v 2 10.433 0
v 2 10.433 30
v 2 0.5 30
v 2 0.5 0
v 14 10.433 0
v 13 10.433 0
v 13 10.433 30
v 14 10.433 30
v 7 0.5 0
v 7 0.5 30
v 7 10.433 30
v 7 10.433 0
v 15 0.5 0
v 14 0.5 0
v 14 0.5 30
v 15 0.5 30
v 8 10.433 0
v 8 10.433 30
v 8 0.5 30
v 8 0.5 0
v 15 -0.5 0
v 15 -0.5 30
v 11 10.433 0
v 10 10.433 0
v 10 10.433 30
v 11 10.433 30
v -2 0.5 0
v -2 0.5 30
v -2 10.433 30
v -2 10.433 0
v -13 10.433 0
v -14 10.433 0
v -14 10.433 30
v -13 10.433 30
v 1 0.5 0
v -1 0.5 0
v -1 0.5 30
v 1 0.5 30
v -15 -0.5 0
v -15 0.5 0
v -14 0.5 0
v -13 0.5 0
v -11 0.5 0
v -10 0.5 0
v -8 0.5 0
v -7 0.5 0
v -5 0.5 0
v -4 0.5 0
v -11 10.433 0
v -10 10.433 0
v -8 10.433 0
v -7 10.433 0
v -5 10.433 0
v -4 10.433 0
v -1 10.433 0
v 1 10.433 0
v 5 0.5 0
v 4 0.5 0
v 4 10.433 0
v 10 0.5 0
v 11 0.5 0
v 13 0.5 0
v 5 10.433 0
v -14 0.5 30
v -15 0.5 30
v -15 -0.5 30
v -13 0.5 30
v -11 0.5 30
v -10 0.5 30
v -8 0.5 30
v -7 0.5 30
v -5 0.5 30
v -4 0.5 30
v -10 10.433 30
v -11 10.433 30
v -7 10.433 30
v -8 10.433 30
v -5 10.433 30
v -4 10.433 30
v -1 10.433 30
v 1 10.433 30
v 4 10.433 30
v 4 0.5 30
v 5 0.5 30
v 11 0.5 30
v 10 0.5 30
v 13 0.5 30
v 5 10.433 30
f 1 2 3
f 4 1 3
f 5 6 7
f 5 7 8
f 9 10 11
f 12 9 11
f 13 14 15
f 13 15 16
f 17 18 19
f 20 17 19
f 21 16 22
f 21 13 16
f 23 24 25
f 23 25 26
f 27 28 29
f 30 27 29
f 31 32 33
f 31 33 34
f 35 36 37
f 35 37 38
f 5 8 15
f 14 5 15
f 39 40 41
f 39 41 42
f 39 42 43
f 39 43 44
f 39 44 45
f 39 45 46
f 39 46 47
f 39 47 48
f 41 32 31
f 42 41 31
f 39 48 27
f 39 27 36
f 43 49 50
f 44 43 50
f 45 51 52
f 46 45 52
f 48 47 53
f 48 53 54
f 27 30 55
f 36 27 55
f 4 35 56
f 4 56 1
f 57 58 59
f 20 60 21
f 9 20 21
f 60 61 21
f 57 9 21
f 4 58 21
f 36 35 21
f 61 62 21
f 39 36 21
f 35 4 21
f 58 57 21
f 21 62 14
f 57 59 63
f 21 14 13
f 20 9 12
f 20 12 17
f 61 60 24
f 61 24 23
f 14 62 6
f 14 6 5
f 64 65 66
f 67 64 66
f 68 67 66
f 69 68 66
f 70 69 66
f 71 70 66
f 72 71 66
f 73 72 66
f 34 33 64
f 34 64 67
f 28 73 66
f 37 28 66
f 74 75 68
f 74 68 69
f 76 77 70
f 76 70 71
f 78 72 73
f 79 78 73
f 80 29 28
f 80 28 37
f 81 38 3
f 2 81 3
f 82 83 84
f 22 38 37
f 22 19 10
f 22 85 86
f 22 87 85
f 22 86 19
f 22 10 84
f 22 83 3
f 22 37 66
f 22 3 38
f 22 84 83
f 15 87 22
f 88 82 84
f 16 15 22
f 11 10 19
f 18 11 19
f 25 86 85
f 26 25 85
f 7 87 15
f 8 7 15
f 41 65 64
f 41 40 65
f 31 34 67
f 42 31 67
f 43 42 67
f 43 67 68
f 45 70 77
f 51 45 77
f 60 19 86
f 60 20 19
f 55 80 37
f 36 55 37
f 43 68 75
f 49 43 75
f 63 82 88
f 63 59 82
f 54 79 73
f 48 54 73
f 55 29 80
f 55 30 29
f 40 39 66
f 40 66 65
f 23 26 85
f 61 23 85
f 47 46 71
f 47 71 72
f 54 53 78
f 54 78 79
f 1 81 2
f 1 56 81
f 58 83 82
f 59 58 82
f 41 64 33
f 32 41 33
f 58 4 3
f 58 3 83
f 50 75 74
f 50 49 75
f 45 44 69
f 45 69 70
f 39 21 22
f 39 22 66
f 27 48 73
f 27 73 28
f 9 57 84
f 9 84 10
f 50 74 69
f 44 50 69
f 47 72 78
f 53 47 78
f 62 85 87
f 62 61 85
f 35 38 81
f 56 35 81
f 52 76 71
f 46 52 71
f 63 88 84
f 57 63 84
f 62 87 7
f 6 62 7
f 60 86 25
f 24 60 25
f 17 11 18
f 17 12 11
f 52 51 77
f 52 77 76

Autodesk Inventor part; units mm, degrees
ref_plane "YZ Plane" through (0, 0, 0) normal (1, 0, 0) x (0, 1, 0)
ref_plane "XZ Plane" through (0, 0, 0) normal (0, 1, 0) x (-1, 0, 0)
ref_plane "XY Plane" through (0, 0, 0) normal (0, 0, 1) x (1, 0, 0)
sketch "Sketch1" plane through (0, 0, 0) normal (0, 0, 1) x (1, 0, 0)
  line L0 (-15, 0.5) -> (15, 0.5)
  line L1 (15, 0.5) -> (15, -0.5)
  line L2 (15, -0.5) -> (-15, -0.5)
  line L3 (-15, -0.5) -> (-15, 0.5)
  line L4 (-15, 0.5) -> (15, -0.5) construction
  line L5 (15, 0.5) -> (-15, -0.5) construction
  line L6 (-14, 10.4333) -> (-13, 10.4333)
  line L7 (-13, 10.4333) -> (-13, 0.4333)
  line L8 (-13, 0.4333) -> (-14, 0.4333)
  line L9 (-14, 0.4333) -> (-14, 10.4333)
  line L10 (-14, 10.4333) -> (-13, 0.4333) construction
  line L11 (-13, 10.4333) -> (-14, 0.4333) construction
  line L12 (-11, 10.4333) -> (-10, 10.4333)
  line L13 (-10, 10.4333) -> (-10, 0.4333)
  line L14 (-10, 0.4333) -> (-11, 0.4333)
  line L15 (-11, 0.4333) -> (-11, 10.4333)
  line L16 (-11, 10.4333) -> (-10, 0.4333) construction
  line L17 (-10, 10.4333) -> (-11, 0.4333) construction
  line L18 (-8, 10.4333) -> (-7, 10.4333)
  line L19 (-7, 10.4333) -> (-7, 0.4333)
  line L20 (-7, 0.4333) -> (-8, 0.4333)
  line L21 (-8, 0.4333) -> (-8, 10.4333)
  line L22 (-8, 10.4333) -> (-7, 0.4333) construction
  line L23 (-7, 10.4333) -> (-8, 0.4333) construction
  line L24 (-5, 10.4333) -> (-4, 10.4333)
  line L25 (-4, 10.4333) -> (-4, 0.4333)
  line L26 (-4, 0.4333) -> (-5, 0.4333)
  line L27 (-5, 0.4333) -> (-5, 10.4333)
  line L28 (-5, 10.4333) -> (-4, 0.4333) construction
  line L29 (-4, 10.4333) -> (-5, 0.4333) construction
  line L30 (-2, 10.4333) -> (-1, 10.4333)
  line L31 (-1, 10.4333) -> (-1, 0.4333)
  line L32 (-1, 0.4333) -> (-2, 0.4333)
  line L33 (-2, 0.4333) -> (-2, 10.4333)
  line L34 (-2, 10.4333) -> (-1, 0.4333) construction
  line L35 (-1, 10.4333) -> (-2, 0.4333) construction
  line L36 (1, 10.4333) -> (2, 10.4333)
  line L37 (2, 10.4333) -> (2, 0.4333)
  line L38 (2, 0.4333) -> (1, 0.4333)
  line L39 (1, 0.4333) -> (1, 10.4333)
  line L40 (1, 10.4333) -> (2, 0.4333) construction
  line L41 (2, 10.4333) -> (1, 0.4333) construction
  line L42 (4, 10.4333) -> (5, 10.4333)
  line L43 (5, 10.4333) -> (5, 0.4333)
  line L44 (5, 0.4333) -> (4, 0.4333)
  line L45 (4, 0.4333) -> (4, 10.4333)
  line L46 (4, 10.4333) -> (5, 0.4333) construction
  line L47 (5, 10.4333) -> (4, 0.4333) construction
  line L48 (7, 10.4333) -> (8, 10.4333)
  line L49 (8, 10.4333) -> (8, 0.4333)
  line L50 (8, 0.4333) -> (7, 0.4333)
  line L51 (7, 0.4333) -> (7, 10.4333)
  line L52 (7, 10.4333) -> (8, 0.4333) construction
  line L53 (8, 10.4333) -> (7, 0.4333) construction
  line L54 (10, 10.4333) -> (11, 10.4333)
  line L55 (11, 10.4333) -> (11, 0.4333)
  line L56 (11, 0.4333) -> (10, 0.4333)
  line L57 (10, 0.4333) -> (10, 10.4333)
  line L58 (10, 10.4333) -> (11, 0.4333) construction
  line L59 (11, 10.4333) -> (10, 0.4333) construction
  line L60 (13, 10.4333) -> (14, 10.4333)
  line L61 (14, 10.4333) -> (14, 0.4333)
  line L62 (14, 0.4333) -> (13, 0.4333)
  line L63 (13, 0.4333) -> (13, 10.4333)
  line L64 (13, 10.4333) -> (14, 0.4333) construction
  line L65 (14, 10.4333) -> (13, 0.4333) construction
  point P0 (0, 0)
  point P1 (-13.5, 5.4333)
  point P2 (-12, 0.5)
  point P3 (-10.5, 5.4333)
  point P4 (-9, 0.5)
  point P5 (-7.5, 5.4333)
  point P6 (-6, 0.5)
  point P7 (-4.5, 5.4333)
  point P8 (-3, 0.5)
  point P9 (-1.5, 5.4333)
  point P10 (0, 0.5)
  point P11 (1.5, 5.4333)
  point P12 (3, 0.5)
  point P13 (4.5, 5.4333)
  point P14 (6, 0.5)
  point P15 (7.5, 5.4333)
  point P16 (9, 0.5)
  point P17 (10.5, 5.4333)
  point P18 (12, 0.5)
  point P19 (13.5, 5.4333)
  point P20 (13, 0.5)
  point P21 (11, 0.5)
  point P22 (10, 0.5)
  point P23 (8, 0.5)
  point P24 (7, 0.5)
  point P25 (5, 0.5)
  point P26 (4, 0.5)
  point P27 (2, 0.5)
  point P28 (1, 0.5)
  point P29 (-1, 0.5)
  point P30 (-2, 0.5)
  point P31 (-4, 0.5)
  point P32 (-5, 0.5)
  point P33 (-7, 0.5)
  point P34 (-8, 0.5)
  point P35 (-10, 0.5)
  point P36 (-11, 0.5)
  point P37 (-13, 0.5)
  point P38 (14, 0.5)
  point P39 (-14, 0.5)
  dimension "d0" = 1
  dimension "d1" = 30
  dimension "d2" = 1
  dimension "d3" = 10
  dimension "d6" = 3
  dimension "d13" = 1
  dimension "d14" = 1
extrude "Extrusion1" add sketch "Sketch1" along normal blind 30
properties part number "cooler_plate" material "Aluminum 6061"
